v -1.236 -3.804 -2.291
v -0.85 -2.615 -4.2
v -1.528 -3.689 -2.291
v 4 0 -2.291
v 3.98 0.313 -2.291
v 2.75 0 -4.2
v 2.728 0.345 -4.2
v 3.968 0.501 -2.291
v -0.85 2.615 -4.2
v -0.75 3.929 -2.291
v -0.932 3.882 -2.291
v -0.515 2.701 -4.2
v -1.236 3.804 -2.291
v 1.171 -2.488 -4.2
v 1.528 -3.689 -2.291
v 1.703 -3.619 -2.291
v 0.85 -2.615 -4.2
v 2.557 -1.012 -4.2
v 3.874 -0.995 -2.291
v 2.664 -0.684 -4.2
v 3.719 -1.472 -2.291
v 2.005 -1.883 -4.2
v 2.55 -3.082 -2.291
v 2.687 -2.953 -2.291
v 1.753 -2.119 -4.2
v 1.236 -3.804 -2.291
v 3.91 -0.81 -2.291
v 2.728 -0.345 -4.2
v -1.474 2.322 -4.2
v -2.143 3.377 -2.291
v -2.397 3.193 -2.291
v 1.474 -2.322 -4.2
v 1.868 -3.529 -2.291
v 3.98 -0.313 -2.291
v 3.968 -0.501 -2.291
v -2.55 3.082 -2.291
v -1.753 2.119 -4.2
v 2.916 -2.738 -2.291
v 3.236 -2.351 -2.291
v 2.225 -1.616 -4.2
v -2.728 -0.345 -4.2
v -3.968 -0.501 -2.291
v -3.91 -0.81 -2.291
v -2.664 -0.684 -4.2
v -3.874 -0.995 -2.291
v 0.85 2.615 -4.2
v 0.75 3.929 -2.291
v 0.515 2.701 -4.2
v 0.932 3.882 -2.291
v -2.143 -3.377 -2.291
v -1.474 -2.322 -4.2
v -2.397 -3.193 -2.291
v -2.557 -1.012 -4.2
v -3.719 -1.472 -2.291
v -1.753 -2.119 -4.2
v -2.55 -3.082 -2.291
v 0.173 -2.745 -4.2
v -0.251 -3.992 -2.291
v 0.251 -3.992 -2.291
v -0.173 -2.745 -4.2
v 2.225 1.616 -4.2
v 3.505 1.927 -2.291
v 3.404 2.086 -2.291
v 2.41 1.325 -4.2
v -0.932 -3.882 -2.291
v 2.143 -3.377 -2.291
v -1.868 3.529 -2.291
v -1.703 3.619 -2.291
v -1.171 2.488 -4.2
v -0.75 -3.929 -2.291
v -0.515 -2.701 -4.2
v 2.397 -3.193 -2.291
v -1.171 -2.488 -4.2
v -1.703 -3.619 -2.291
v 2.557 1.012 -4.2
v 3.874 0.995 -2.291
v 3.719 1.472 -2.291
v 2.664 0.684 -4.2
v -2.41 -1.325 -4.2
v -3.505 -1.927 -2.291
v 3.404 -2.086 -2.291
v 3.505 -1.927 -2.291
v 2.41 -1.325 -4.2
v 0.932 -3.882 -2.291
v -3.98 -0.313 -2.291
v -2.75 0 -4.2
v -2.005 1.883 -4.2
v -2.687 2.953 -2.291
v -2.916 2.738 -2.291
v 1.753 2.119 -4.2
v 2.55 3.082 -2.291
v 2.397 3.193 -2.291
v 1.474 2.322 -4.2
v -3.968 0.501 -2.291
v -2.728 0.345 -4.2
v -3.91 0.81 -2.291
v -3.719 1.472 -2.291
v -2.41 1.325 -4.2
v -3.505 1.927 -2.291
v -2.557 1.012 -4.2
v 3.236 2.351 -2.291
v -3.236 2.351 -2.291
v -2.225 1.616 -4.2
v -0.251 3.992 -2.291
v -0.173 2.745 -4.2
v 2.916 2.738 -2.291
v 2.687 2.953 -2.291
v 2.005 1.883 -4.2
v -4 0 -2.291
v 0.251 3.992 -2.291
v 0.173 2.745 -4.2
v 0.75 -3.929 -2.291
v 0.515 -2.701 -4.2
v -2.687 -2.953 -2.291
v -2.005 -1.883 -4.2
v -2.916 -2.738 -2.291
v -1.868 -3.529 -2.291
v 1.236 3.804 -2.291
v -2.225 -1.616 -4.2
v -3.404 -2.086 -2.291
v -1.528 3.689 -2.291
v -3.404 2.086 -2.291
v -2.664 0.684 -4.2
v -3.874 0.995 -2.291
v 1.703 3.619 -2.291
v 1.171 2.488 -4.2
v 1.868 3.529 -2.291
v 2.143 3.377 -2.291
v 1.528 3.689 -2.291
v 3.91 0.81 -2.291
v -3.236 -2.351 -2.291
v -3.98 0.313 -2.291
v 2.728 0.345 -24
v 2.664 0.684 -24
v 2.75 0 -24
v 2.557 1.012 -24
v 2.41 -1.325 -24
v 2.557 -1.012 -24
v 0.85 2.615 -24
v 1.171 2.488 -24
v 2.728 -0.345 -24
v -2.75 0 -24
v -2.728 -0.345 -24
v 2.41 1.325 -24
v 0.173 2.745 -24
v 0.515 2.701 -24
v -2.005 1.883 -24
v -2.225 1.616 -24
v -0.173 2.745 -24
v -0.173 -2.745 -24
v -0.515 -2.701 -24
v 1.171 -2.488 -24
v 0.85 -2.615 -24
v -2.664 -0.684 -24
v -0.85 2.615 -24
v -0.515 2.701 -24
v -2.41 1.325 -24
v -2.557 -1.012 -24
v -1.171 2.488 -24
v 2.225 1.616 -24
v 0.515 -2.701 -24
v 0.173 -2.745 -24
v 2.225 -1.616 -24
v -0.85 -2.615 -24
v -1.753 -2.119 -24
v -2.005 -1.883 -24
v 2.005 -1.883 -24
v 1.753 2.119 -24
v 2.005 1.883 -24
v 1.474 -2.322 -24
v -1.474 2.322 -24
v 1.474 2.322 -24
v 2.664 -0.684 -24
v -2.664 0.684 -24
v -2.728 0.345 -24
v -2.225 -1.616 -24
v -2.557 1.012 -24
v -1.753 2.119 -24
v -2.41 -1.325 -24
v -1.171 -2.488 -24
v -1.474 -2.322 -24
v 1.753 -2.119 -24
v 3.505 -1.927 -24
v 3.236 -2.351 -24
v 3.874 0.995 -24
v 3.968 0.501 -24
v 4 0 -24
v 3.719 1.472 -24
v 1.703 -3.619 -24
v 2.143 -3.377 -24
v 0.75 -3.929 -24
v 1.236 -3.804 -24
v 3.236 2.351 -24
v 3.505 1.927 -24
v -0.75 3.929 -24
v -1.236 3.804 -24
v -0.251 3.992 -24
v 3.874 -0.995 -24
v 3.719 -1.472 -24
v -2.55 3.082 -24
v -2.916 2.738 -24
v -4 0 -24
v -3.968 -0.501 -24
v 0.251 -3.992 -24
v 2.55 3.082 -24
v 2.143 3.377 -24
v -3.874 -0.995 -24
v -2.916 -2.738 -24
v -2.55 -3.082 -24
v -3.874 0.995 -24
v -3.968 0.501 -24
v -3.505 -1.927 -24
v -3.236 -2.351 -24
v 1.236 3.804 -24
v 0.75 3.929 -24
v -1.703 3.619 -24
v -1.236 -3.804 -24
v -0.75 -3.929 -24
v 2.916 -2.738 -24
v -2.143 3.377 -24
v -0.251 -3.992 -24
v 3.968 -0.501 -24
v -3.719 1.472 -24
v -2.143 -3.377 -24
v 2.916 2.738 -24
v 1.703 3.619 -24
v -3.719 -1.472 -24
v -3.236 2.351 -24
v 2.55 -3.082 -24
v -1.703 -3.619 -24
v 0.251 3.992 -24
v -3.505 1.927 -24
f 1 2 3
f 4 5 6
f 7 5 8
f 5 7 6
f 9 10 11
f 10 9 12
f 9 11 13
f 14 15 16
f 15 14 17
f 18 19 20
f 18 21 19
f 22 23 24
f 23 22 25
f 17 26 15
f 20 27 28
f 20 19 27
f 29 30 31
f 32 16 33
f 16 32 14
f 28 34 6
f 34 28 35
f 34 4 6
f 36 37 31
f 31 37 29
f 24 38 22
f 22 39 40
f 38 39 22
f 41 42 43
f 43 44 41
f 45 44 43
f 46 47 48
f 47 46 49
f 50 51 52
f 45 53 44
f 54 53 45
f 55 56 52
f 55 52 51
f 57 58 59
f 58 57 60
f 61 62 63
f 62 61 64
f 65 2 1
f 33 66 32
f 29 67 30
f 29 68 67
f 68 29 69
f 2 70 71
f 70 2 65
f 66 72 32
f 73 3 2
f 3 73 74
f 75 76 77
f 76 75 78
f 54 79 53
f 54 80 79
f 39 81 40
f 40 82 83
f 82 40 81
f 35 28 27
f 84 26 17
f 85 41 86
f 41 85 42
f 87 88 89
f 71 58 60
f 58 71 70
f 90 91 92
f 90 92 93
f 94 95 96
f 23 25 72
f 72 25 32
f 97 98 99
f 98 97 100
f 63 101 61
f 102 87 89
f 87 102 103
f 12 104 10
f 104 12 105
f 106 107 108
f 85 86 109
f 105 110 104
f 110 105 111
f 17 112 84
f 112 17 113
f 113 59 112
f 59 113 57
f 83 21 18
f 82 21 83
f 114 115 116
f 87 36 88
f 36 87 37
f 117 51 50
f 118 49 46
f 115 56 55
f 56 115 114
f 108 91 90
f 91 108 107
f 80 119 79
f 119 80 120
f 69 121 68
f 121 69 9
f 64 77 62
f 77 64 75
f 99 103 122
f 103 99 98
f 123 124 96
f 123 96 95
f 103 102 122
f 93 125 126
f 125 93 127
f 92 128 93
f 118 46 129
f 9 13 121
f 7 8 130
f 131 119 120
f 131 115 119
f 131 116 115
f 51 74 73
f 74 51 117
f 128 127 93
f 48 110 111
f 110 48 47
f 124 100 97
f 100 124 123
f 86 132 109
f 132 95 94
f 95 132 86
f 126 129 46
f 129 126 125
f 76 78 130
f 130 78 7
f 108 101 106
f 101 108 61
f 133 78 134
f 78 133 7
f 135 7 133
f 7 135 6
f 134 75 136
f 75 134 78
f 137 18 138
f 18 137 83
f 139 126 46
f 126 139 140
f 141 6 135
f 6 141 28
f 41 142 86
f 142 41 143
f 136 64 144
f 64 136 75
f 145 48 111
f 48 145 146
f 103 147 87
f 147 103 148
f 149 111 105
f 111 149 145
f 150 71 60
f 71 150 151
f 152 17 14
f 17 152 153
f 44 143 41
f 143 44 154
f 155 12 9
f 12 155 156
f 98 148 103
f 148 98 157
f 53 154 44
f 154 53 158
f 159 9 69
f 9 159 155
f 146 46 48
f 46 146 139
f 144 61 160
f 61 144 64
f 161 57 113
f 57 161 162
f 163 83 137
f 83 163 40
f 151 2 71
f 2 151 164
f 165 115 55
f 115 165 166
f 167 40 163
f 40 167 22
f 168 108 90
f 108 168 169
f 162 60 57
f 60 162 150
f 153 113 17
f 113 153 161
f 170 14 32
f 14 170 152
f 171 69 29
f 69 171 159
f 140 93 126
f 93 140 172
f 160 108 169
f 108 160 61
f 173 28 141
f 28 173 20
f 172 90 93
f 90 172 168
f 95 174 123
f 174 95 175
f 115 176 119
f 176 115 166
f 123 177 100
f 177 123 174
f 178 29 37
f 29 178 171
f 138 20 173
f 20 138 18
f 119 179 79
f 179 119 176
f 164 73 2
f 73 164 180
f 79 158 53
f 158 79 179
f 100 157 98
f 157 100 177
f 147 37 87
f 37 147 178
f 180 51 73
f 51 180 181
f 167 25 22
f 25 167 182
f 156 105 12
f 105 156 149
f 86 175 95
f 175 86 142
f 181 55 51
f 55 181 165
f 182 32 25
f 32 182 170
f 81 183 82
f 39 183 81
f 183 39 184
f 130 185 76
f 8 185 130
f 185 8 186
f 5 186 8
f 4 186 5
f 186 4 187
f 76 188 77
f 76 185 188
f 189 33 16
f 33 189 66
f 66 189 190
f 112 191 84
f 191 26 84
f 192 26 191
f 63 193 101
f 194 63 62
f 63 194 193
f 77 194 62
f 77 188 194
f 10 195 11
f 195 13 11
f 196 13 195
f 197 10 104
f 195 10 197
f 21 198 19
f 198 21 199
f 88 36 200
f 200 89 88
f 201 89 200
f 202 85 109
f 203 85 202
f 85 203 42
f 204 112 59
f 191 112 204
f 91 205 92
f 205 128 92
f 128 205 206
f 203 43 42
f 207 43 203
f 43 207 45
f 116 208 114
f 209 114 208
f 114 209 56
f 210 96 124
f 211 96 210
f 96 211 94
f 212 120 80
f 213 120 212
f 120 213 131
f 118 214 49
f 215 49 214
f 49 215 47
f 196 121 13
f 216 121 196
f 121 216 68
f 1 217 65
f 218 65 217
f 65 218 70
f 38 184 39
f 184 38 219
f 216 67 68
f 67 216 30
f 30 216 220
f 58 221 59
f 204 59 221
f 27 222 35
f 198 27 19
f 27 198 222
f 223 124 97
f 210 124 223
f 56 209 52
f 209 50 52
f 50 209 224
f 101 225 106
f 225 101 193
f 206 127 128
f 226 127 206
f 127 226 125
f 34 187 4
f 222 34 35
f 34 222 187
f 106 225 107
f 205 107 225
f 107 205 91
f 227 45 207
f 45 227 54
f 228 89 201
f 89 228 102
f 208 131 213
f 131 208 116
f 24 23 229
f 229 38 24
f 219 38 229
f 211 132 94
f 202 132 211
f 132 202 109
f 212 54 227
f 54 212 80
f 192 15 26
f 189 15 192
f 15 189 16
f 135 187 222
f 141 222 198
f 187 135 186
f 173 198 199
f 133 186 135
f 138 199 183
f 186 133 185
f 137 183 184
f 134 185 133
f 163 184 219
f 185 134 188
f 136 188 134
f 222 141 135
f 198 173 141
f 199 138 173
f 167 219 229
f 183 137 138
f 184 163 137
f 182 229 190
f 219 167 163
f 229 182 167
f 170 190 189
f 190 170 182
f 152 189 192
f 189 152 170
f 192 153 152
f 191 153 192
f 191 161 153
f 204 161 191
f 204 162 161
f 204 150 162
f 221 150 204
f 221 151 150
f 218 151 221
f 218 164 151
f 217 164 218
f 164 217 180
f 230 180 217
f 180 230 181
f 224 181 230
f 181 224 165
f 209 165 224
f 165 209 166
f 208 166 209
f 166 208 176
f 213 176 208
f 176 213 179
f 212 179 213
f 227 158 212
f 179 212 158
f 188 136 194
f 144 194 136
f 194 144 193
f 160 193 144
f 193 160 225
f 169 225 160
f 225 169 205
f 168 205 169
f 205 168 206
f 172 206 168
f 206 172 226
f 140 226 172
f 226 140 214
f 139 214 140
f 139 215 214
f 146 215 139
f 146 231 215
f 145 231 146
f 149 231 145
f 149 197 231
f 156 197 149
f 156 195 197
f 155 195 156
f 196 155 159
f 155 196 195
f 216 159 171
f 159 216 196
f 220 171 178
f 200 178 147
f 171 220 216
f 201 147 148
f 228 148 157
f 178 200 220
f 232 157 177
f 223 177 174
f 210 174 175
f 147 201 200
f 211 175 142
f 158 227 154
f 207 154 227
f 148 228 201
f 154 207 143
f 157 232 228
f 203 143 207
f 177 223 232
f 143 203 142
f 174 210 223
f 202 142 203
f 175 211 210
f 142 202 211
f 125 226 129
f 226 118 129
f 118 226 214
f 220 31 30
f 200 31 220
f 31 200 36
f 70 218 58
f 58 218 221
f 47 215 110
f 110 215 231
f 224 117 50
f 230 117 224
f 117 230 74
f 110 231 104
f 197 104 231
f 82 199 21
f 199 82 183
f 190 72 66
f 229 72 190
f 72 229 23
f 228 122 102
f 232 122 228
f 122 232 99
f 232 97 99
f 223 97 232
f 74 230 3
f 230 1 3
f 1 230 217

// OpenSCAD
$fn = 50;

difference() {
	union() {
		translate(v = [0, 0, -24.0]) {
			cylinder(h = 24, r = 4.0);
		}
	}
	union() {
		translate(v = [0, 0, 0]) {
			rotate(a = [0, 0, 0]) {
				difference() {
					union() {
						translate(v = [0, 0, -27.0]) {
							cylinder(h = 27, r = 2.25);
						}
						translate(v = [0, 0, -4.2]) {
							cylinder(h = 4.2, r1 = 2.75, r2 = 5.5);
						}
						translate(v = [0, 0, -27.0]) {
							cylinder(h = 27, r = 2.75);
						}
						translate(v = [0, 0, -27.0]) {
							cylinder(h = 27, r = 2.25);
						}
					}
					union();
				}
			}
		}
	}
}
